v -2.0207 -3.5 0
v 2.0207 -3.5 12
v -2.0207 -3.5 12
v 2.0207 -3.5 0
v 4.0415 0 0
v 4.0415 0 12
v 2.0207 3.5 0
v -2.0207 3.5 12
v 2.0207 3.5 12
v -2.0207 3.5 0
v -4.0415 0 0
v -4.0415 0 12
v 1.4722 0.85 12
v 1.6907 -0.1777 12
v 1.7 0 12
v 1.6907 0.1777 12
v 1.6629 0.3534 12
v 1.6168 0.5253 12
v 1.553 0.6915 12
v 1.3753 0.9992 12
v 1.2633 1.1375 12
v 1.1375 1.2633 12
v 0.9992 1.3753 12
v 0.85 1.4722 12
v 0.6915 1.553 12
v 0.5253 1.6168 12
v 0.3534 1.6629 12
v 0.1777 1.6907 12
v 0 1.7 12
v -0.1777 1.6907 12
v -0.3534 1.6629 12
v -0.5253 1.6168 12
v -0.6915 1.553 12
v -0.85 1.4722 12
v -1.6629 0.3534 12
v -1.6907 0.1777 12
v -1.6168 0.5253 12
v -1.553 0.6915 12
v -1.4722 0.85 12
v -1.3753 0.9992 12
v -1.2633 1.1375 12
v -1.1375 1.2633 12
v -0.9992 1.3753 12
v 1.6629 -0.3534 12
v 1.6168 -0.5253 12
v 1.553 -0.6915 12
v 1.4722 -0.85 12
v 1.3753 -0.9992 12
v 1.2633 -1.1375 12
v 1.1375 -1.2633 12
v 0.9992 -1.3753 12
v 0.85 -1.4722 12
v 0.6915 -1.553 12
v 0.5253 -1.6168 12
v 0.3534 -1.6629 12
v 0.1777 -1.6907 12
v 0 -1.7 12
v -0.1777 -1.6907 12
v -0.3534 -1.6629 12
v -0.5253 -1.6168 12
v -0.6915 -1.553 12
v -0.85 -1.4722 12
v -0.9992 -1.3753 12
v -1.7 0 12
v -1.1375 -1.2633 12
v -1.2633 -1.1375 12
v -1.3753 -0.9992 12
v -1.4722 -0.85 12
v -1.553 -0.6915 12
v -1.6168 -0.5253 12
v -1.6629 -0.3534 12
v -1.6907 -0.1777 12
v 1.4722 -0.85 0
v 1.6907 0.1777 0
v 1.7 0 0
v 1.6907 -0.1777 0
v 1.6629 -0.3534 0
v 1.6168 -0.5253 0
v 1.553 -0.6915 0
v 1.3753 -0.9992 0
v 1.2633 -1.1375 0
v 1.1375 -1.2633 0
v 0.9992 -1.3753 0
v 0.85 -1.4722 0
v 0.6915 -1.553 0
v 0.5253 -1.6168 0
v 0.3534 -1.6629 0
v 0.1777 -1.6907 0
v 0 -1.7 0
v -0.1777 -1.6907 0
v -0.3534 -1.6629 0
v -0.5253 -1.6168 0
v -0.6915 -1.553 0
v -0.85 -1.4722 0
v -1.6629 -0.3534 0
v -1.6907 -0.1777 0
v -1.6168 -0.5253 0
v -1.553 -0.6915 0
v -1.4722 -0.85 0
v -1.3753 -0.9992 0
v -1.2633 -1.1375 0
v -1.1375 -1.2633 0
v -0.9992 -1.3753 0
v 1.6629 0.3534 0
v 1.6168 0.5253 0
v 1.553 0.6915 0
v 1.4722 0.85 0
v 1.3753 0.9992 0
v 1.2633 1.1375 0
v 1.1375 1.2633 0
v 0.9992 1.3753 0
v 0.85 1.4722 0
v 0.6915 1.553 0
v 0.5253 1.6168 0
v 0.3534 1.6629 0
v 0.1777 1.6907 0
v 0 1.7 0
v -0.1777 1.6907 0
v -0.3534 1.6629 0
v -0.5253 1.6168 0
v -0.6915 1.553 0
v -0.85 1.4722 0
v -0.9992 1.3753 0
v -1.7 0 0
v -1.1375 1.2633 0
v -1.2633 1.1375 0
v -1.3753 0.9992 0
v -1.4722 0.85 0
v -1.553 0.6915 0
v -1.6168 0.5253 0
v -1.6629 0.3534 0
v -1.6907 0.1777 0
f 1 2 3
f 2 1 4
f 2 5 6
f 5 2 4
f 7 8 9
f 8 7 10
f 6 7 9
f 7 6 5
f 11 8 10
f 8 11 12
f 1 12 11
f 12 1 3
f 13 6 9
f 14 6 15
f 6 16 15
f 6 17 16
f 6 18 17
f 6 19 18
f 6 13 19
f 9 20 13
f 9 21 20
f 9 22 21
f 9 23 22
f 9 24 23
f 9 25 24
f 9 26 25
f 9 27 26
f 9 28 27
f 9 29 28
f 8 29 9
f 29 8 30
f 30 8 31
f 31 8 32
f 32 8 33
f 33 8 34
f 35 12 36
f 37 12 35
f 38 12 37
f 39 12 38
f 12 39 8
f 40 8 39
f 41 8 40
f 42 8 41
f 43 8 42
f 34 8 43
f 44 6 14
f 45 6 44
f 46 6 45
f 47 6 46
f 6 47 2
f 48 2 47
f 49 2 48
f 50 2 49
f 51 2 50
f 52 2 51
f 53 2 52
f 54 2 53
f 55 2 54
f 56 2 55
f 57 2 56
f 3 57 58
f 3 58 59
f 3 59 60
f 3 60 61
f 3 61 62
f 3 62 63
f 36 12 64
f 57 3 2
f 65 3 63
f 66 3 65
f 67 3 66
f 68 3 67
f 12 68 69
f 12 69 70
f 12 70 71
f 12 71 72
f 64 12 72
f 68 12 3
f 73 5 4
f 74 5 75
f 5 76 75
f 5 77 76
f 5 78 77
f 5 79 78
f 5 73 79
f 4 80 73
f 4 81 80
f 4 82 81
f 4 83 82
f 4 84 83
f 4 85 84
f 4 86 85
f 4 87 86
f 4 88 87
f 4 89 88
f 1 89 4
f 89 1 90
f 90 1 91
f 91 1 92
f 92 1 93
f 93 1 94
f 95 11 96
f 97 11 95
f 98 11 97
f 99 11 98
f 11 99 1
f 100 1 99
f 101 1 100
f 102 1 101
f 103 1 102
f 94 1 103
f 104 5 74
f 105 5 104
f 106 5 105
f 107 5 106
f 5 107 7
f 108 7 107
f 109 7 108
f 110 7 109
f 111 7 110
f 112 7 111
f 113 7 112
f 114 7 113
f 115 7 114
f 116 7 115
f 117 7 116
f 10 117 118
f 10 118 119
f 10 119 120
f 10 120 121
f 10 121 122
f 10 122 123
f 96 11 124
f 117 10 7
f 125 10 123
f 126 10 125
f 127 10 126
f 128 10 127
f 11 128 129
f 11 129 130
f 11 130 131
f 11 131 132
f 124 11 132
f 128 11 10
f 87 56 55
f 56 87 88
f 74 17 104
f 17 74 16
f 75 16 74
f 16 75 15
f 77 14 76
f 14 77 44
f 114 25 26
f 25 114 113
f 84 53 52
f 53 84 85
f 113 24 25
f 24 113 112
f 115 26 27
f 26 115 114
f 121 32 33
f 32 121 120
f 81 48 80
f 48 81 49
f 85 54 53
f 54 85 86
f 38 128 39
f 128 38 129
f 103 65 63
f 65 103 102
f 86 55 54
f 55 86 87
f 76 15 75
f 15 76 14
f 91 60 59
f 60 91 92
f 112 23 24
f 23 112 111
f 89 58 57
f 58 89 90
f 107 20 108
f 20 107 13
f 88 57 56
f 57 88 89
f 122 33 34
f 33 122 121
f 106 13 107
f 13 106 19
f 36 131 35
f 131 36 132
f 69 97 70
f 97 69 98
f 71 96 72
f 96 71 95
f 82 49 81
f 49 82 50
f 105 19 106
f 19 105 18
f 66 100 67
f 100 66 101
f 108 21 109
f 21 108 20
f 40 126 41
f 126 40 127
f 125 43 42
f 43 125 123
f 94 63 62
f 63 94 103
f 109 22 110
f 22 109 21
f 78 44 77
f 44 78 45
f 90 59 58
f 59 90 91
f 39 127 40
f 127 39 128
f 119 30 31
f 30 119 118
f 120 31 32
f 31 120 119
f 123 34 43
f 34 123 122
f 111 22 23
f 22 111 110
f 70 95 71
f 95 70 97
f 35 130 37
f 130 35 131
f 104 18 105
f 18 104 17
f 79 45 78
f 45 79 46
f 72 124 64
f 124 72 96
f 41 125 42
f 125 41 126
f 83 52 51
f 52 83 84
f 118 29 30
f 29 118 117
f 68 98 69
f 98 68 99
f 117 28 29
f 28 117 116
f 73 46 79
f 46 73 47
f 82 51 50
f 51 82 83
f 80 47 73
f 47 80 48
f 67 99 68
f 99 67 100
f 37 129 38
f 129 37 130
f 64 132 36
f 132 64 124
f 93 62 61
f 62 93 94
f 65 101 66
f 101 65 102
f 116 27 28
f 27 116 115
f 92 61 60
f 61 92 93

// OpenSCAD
// Hex standoff, 12 mm long.
$fn = 60;
eps = 0.02;
thread_d = 3.4;
flat = 7;
length = 12;
chamfer = 1.2;
difference() {
    union() {
        cylinder(d = flat / cos(30), h = length, $fn = 6);
        cylinder(d1 = flat / cos(30) - 2 * chamfer, d2 = flat / cos(30), h = chamfer, $fn = 6);
        translate([0, 0, length - chamfer]) cylinder(d1 = flat / cos(30), d2 = flat / cos(30) - 2 * chamfer, h = chamfer, $fn = 6);
    }
    translate([0, 0, -eps]) cylinder(d = thread_d, h = length + 2 * eps);
}
